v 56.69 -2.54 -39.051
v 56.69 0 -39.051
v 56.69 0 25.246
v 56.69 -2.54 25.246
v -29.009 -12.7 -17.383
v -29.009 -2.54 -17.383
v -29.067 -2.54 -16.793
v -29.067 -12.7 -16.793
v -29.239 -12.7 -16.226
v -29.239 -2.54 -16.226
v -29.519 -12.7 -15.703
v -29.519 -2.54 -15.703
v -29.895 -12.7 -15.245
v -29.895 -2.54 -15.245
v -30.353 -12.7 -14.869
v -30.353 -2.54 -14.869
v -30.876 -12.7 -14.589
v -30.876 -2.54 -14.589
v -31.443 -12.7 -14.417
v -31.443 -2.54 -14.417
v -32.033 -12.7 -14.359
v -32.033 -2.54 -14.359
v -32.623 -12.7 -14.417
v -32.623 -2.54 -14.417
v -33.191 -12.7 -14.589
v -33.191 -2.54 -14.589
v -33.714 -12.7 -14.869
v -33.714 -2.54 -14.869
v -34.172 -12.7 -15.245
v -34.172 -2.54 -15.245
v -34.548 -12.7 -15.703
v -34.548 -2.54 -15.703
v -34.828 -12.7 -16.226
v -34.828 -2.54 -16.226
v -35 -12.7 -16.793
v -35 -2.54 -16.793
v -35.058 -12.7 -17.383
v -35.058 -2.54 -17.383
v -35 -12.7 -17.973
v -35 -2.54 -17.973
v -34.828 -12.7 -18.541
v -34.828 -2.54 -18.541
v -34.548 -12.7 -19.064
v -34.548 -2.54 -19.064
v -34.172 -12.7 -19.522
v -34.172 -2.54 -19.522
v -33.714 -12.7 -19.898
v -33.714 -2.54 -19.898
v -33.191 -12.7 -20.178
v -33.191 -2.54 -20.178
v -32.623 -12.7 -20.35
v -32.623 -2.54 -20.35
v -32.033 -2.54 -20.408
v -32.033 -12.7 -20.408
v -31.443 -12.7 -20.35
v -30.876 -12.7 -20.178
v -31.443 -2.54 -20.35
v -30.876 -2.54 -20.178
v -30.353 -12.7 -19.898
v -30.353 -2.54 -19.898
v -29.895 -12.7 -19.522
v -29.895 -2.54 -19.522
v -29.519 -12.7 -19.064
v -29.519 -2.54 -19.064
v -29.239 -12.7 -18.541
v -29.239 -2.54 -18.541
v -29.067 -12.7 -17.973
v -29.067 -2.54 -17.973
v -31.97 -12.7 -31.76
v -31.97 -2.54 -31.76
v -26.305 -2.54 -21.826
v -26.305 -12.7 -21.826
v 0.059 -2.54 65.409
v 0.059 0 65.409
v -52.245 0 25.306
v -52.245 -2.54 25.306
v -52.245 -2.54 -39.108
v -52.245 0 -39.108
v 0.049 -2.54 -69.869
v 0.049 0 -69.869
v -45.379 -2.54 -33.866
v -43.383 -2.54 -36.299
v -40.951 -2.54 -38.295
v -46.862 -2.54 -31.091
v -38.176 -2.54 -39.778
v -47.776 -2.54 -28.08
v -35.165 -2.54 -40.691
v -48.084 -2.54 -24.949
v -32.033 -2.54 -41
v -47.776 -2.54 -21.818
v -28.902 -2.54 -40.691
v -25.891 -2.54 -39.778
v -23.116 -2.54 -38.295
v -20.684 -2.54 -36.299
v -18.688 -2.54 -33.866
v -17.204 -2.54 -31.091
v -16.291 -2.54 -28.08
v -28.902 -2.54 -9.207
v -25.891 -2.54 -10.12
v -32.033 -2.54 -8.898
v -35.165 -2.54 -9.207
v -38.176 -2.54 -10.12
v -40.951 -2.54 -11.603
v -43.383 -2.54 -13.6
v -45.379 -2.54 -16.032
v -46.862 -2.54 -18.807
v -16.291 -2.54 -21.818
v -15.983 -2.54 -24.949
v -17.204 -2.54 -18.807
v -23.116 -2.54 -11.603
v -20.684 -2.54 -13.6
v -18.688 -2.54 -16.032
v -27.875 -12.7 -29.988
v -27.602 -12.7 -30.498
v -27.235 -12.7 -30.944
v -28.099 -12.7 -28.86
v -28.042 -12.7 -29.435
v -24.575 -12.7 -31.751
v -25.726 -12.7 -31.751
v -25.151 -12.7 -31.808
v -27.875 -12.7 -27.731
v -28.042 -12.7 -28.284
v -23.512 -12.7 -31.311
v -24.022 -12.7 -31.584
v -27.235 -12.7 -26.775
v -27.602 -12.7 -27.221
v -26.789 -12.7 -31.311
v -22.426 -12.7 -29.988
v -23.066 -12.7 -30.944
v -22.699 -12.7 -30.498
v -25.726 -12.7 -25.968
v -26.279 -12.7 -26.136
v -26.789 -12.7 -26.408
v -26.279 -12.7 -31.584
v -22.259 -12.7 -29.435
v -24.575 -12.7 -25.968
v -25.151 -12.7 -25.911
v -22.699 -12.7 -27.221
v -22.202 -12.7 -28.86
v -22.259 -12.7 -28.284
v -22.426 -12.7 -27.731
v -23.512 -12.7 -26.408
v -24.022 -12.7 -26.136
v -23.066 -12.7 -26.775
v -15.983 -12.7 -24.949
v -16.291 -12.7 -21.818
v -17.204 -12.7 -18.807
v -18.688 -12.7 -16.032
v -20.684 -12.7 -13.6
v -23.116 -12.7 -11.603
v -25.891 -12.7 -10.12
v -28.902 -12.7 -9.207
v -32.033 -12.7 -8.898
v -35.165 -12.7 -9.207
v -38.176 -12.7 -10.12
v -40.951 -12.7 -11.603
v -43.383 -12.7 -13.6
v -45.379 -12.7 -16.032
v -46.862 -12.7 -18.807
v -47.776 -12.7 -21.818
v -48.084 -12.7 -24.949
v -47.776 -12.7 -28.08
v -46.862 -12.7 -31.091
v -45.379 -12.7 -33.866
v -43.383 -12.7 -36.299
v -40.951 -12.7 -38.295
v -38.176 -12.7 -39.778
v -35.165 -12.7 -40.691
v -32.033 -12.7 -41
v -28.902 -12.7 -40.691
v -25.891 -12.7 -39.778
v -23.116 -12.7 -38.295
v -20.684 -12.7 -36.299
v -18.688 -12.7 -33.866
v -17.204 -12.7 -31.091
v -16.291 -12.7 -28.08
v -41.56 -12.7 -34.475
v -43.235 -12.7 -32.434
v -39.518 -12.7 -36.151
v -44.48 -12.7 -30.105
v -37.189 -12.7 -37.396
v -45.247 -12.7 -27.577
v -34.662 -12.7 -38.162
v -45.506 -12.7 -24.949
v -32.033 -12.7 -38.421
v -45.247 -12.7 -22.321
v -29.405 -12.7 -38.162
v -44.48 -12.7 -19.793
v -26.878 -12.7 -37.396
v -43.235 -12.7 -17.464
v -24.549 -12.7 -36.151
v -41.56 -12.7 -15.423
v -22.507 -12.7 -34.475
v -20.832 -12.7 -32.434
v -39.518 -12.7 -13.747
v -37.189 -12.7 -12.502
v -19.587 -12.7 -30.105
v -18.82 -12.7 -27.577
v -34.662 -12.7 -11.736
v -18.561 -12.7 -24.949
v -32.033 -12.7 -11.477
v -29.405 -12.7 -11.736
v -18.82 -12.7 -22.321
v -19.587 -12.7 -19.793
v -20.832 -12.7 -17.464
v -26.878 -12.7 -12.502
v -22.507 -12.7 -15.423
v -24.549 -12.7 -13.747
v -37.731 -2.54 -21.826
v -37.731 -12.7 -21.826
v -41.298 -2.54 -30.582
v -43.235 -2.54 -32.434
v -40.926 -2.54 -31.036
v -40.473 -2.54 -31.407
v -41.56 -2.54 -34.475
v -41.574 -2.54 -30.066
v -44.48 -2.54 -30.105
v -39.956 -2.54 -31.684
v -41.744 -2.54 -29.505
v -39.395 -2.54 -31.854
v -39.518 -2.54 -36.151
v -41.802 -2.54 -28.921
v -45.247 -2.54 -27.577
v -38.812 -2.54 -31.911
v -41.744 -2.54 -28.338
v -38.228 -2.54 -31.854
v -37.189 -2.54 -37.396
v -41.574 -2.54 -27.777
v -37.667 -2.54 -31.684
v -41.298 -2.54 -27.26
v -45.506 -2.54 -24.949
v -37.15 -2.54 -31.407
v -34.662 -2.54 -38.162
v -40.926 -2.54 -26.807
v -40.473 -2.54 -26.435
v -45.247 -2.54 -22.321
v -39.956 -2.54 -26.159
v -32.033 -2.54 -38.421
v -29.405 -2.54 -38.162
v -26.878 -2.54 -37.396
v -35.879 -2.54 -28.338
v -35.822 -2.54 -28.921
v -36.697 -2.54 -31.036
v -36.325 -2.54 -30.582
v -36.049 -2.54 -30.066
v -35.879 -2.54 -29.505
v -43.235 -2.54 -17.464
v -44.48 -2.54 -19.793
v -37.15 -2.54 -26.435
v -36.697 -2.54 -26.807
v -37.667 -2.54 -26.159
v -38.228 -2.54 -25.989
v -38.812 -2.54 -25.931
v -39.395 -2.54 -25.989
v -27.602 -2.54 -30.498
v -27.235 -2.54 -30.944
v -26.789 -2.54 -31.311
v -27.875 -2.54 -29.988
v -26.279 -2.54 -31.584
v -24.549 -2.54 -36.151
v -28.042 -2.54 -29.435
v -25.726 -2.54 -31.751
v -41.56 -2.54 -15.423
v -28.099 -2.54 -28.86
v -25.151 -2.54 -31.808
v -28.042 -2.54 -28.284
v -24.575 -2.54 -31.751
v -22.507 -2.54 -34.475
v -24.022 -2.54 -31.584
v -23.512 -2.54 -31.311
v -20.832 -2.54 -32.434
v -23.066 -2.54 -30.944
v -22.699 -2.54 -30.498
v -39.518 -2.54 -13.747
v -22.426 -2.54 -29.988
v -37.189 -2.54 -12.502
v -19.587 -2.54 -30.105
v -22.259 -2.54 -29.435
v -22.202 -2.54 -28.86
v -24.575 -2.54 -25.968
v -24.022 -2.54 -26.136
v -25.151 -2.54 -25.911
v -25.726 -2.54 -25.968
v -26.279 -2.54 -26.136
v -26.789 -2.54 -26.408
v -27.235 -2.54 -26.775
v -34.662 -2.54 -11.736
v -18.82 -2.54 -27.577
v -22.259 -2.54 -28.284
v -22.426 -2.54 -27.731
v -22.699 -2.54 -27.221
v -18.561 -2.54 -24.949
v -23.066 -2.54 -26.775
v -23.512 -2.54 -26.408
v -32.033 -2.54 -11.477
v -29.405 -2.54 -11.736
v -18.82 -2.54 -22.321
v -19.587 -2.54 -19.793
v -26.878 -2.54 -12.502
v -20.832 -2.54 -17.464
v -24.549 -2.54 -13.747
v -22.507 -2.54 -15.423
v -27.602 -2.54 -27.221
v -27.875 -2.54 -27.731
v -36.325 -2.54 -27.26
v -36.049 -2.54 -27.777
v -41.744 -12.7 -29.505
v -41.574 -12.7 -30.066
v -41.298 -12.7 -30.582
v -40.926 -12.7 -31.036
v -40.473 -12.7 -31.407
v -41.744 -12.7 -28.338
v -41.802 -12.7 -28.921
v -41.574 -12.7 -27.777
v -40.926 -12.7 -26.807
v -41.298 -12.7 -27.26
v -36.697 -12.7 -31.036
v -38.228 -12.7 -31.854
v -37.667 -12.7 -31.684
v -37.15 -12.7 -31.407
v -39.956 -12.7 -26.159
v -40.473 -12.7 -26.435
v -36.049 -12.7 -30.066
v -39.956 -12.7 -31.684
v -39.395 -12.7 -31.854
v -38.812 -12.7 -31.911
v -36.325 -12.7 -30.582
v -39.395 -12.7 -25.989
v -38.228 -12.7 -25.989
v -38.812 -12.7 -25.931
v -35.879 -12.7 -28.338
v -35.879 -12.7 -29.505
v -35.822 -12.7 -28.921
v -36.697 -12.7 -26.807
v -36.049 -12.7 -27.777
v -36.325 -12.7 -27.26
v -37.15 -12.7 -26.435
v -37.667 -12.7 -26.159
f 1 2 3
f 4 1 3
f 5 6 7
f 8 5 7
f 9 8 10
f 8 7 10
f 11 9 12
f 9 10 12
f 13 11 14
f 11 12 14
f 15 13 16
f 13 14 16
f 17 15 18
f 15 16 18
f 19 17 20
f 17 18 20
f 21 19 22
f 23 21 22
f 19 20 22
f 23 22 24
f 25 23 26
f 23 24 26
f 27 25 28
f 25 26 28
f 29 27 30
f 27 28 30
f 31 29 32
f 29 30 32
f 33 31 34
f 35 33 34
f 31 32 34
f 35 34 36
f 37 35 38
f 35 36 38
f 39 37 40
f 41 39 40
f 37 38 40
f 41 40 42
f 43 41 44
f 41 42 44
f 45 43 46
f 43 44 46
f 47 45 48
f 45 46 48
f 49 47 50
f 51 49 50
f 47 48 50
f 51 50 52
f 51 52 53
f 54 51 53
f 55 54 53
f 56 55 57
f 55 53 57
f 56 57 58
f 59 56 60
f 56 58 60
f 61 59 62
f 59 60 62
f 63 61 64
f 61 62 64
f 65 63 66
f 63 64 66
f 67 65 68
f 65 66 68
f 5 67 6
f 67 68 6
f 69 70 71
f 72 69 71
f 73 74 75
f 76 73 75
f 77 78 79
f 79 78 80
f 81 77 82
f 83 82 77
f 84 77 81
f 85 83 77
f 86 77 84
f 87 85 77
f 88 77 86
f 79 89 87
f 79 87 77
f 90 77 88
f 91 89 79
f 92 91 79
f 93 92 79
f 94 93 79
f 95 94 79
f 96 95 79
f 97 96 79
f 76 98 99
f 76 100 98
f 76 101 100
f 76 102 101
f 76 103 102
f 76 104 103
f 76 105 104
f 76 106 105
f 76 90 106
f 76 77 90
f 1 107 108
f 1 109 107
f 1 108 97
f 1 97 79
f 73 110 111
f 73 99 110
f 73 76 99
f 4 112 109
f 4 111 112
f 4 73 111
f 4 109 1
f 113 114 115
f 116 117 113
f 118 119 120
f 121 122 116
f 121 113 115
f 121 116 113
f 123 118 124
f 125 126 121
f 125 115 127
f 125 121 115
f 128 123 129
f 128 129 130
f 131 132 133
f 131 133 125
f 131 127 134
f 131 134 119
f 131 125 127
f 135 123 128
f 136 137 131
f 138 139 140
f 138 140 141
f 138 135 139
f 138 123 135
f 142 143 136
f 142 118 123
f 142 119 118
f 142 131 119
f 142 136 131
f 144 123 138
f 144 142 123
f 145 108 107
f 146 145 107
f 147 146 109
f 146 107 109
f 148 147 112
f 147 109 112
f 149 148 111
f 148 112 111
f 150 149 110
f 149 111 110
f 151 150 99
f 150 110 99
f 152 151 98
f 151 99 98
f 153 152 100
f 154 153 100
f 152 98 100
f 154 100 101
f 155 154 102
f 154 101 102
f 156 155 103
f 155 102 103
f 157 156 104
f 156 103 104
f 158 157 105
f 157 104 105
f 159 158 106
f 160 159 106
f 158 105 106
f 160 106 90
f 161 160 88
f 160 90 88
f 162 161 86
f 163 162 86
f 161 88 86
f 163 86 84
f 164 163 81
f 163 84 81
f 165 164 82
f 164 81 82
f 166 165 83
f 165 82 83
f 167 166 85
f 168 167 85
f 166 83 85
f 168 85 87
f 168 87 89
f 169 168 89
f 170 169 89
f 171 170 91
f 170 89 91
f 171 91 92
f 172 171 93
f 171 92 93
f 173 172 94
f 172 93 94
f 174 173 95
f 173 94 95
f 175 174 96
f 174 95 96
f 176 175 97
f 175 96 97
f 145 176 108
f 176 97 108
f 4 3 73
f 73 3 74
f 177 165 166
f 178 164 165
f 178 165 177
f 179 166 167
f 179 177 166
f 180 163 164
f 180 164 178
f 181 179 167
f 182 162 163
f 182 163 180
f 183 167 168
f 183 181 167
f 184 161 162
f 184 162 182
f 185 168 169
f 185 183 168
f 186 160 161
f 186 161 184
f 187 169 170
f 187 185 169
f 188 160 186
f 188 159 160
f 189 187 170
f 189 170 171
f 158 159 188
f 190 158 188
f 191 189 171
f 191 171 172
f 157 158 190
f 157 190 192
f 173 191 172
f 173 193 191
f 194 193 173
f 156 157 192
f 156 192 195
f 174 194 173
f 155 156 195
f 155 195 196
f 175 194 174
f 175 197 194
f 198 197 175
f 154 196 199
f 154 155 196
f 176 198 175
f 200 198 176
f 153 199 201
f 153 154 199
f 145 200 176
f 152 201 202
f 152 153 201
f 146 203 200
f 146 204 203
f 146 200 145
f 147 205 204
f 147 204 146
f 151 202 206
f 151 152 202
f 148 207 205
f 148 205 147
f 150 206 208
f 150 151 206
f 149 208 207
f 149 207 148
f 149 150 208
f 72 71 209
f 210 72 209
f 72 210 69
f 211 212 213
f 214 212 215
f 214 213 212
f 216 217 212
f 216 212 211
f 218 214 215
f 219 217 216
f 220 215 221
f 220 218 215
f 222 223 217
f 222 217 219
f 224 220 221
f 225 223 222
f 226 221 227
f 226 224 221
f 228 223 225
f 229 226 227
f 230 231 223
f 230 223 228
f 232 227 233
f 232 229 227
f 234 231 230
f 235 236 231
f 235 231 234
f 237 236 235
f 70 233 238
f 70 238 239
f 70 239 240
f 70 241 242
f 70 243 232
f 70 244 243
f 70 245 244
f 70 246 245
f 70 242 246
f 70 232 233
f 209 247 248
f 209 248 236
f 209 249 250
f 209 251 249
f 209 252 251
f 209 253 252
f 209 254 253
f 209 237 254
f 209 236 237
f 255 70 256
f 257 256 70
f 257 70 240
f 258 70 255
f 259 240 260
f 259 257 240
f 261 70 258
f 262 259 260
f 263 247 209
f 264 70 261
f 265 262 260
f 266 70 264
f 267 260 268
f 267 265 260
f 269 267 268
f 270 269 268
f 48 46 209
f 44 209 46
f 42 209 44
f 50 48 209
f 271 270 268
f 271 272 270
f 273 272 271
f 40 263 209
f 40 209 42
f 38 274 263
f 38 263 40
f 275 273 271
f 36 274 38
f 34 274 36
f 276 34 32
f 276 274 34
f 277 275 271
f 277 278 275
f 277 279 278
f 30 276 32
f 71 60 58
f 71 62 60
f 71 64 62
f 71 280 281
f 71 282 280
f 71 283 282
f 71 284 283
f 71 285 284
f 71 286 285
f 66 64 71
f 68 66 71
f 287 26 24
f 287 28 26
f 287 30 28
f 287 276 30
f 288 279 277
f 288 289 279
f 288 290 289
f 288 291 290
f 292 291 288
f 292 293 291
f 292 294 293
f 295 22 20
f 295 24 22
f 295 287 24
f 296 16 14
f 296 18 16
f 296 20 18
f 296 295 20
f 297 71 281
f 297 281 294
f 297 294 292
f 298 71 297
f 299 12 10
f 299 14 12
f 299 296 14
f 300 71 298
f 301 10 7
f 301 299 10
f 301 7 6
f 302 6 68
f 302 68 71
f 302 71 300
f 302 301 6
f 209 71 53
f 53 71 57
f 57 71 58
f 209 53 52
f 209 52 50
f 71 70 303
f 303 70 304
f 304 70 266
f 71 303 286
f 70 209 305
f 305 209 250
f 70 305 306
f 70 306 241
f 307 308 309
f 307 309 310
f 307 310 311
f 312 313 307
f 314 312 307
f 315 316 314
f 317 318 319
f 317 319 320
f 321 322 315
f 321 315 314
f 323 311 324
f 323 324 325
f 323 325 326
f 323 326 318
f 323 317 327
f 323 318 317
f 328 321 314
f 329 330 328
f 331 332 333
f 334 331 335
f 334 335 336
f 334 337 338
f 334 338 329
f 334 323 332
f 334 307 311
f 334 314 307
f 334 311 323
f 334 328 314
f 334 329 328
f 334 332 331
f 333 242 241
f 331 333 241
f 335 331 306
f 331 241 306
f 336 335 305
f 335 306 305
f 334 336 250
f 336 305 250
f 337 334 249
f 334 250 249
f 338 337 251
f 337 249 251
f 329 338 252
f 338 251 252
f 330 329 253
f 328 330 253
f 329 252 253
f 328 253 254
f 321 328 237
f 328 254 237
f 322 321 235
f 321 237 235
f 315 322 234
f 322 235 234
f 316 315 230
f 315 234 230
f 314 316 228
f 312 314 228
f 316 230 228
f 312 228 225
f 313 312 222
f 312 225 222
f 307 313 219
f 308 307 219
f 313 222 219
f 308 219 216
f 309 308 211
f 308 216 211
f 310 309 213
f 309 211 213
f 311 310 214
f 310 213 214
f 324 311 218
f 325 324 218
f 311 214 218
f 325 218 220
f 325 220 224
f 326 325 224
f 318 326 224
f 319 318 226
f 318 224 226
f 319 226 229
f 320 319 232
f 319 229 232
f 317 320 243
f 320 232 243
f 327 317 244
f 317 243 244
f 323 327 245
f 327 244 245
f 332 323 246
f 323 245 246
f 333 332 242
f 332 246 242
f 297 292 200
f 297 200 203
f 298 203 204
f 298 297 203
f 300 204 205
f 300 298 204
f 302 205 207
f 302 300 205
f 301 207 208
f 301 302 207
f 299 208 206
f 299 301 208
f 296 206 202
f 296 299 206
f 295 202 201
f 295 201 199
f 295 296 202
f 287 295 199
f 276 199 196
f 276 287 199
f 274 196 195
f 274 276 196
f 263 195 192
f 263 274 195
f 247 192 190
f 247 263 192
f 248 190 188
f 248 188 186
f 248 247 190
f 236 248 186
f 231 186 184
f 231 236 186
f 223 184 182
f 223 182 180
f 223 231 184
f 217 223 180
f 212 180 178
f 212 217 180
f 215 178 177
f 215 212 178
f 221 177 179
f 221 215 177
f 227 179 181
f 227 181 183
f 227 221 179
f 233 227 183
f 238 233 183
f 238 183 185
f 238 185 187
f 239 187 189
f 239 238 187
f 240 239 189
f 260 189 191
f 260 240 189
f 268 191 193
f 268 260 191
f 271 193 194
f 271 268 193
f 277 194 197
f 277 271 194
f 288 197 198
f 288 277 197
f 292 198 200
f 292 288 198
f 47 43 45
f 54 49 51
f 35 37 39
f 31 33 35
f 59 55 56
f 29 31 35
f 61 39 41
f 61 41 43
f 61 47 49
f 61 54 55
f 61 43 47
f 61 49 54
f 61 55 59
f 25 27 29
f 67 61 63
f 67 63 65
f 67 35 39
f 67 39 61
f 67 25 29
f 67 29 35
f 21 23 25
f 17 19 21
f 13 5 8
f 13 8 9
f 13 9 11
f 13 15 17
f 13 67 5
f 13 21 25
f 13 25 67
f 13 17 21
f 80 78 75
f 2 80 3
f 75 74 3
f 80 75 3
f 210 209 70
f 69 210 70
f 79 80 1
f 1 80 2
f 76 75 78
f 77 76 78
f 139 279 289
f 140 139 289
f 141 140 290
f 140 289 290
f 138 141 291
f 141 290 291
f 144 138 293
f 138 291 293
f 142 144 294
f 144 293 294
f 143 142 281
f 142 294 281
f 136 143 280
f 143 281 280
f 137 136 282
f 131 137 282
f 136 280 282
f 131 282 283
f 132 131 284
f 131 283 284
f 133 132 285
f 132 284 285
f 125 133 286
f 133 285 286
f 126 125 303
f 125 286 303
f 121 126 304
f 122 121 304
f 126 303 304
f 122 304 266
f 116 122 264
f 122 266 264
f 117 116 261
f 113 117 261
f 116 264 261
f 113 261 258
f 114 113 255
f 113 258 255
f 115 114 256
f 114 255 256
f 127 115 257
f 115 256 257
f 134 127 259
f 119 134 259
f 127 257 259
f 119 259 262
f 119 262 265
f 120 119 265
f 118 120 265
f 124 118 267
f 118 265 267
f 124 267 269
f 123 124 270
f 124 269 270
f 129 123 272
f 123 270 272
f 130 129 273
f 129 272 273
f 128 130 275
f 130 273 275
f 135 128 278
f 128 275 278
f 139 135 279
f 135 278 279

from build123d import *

# Parameters (mm, degrees)
F1_DEPTH  = 12.7
F2_DEPTH  = 2.54
F3_DEPTH  = 7.62
F4_DEPTH  = 2.54
F5_DEPTH  = 2.54
F6_DEPTH  = 2.54
F7_DEPTH  = 2.54
F8_DEPTH  = 2.54
F9_DEPTH  = 2.54
F10_R     = 16.050678096
F10_R_2   = 13.472274859
F10_R_3   = 3.0244847624
F10_R_4   = 2.9484981223
F10_R_5   = 2.9899979454
F11_DEPTH = 10.16


with BuildPart() as f1:
    # F0 (on Front) → F1 (new body)
    with BuildSketch(Plane.XZ):
        Polygon((59.2296272516, 26.558874175), (0, 68.5641244054), (-54.7846257687, 26.558874175), (-54.7846257687, -40.5606217682), (0, -72.7868750691), (59.2296272516, -40.5606217682), align=None)
    extrude(amount=F1_DEPTH)

    # F2 (cut): a face of the model
    f2_faces = [f1.faces().sort_by_distance(p)[0] for p in [
        (1.9587071028, -12.7, -4.2659517496),
    ]]
    extrude(f2_faces, amount=-F2_DEPTH, mode=Mode.SUBTRACT)

    # F3 (cut): a face of the model
    f3_faces = [f1.faces().sort_by_distance(p)[0] for p in [
        (1.9587071028, -10.16, -4.2659517496),
    ]]
    extrude(f3_faces, amount=-F3_DEPTH, mode=Mode.SUBTRACT)

    # F4 (cut): a face of the model
    f4_faces = [f1.faces().sort_by_distance(p)[0] for p in [
        (29.6148136258, -1.27, 47.5614992902),
    ]]
    extrude(f4_faces, amount=-F4_DEPTH, mode=Mode.SUBTRACT)

    # F5 (cut): a face of the model
    f5_faces = [f1.faces().sort_by_distance(p)[0] for p in [
        (-27.3923128843, -1.27, 47.5614992902),
    ]]
    extrude(f5_faces, amount=-F5_DEPTH, mode=Mode.SUBTRACT)

    # F6 (cut): a face of the model
    f6_faces = [f1.faces().sort_by_distance(p)[0] for p in [
        (59.2296272516, -1.27, -7.0008737966),
    ]]
    extrude(f6_faces, amount=-F6_DEPTH, mode=Mode.SUBTRACT)

    # F7 (cut): a face of the model
    f7_faces = [f1.faces().sort_by_distance(p)[0] for p in [
        (-54.7846257687, -1.27, -7.0008737966),
    ]]
    extrude(f7_faces, amount=-F7_DEPTH, mode=Mode.SUBTRACT)

    # F8 (cut): a face of the model
    f8_faces = [f1.faces().sort_by_distance(p)[0] for p in [
        (-27.3923128843, -1.27, -56.6737484187),
    ]]
    extrude(f8_faces, amount=-F8_DEPTH, mode=Mode.SUBTRACT)

    # F9 (cut): a face of the model
    f9_faces = [f1.faces().sort_by_distance(p)[0] for p in [
        (29.6148136258, -1.27, -56.6737484187),
    ]]
    extrude(f9_faces, amount=-F9_DEPTH, mode=Mode.SUBTRACT)

    # F10 (on face) → F11 (join)
    with BuildSketch(Plane.XZ.offset(2.54)):
        with Locations((-32.0333689451, -24.9490719289)):
            Circle(F10_R)
        with Locations((-32.0333689451, -24.9490719289)):
            Circle(F10_R_2, mode=Mode.SUBTRACT)
        with Locations((-32.0333689451, -17.3833221197)):
            Circle(F10_R_3)
        with Locations((-25.150520727, -28.8595743477)):
            Circle(F10_R_4)
        with Locations((-38.8115644455, -28.9213098586)):
            Circle(F10_R_5)
        Polygon((-26.3045579195, -21.8257736415), (-37.7313010395, -21.8257736415), (-31.9700799882, -31.7595750093), align=None)
    extrude(amount=F11_DEPTH)


solid = f1.part
